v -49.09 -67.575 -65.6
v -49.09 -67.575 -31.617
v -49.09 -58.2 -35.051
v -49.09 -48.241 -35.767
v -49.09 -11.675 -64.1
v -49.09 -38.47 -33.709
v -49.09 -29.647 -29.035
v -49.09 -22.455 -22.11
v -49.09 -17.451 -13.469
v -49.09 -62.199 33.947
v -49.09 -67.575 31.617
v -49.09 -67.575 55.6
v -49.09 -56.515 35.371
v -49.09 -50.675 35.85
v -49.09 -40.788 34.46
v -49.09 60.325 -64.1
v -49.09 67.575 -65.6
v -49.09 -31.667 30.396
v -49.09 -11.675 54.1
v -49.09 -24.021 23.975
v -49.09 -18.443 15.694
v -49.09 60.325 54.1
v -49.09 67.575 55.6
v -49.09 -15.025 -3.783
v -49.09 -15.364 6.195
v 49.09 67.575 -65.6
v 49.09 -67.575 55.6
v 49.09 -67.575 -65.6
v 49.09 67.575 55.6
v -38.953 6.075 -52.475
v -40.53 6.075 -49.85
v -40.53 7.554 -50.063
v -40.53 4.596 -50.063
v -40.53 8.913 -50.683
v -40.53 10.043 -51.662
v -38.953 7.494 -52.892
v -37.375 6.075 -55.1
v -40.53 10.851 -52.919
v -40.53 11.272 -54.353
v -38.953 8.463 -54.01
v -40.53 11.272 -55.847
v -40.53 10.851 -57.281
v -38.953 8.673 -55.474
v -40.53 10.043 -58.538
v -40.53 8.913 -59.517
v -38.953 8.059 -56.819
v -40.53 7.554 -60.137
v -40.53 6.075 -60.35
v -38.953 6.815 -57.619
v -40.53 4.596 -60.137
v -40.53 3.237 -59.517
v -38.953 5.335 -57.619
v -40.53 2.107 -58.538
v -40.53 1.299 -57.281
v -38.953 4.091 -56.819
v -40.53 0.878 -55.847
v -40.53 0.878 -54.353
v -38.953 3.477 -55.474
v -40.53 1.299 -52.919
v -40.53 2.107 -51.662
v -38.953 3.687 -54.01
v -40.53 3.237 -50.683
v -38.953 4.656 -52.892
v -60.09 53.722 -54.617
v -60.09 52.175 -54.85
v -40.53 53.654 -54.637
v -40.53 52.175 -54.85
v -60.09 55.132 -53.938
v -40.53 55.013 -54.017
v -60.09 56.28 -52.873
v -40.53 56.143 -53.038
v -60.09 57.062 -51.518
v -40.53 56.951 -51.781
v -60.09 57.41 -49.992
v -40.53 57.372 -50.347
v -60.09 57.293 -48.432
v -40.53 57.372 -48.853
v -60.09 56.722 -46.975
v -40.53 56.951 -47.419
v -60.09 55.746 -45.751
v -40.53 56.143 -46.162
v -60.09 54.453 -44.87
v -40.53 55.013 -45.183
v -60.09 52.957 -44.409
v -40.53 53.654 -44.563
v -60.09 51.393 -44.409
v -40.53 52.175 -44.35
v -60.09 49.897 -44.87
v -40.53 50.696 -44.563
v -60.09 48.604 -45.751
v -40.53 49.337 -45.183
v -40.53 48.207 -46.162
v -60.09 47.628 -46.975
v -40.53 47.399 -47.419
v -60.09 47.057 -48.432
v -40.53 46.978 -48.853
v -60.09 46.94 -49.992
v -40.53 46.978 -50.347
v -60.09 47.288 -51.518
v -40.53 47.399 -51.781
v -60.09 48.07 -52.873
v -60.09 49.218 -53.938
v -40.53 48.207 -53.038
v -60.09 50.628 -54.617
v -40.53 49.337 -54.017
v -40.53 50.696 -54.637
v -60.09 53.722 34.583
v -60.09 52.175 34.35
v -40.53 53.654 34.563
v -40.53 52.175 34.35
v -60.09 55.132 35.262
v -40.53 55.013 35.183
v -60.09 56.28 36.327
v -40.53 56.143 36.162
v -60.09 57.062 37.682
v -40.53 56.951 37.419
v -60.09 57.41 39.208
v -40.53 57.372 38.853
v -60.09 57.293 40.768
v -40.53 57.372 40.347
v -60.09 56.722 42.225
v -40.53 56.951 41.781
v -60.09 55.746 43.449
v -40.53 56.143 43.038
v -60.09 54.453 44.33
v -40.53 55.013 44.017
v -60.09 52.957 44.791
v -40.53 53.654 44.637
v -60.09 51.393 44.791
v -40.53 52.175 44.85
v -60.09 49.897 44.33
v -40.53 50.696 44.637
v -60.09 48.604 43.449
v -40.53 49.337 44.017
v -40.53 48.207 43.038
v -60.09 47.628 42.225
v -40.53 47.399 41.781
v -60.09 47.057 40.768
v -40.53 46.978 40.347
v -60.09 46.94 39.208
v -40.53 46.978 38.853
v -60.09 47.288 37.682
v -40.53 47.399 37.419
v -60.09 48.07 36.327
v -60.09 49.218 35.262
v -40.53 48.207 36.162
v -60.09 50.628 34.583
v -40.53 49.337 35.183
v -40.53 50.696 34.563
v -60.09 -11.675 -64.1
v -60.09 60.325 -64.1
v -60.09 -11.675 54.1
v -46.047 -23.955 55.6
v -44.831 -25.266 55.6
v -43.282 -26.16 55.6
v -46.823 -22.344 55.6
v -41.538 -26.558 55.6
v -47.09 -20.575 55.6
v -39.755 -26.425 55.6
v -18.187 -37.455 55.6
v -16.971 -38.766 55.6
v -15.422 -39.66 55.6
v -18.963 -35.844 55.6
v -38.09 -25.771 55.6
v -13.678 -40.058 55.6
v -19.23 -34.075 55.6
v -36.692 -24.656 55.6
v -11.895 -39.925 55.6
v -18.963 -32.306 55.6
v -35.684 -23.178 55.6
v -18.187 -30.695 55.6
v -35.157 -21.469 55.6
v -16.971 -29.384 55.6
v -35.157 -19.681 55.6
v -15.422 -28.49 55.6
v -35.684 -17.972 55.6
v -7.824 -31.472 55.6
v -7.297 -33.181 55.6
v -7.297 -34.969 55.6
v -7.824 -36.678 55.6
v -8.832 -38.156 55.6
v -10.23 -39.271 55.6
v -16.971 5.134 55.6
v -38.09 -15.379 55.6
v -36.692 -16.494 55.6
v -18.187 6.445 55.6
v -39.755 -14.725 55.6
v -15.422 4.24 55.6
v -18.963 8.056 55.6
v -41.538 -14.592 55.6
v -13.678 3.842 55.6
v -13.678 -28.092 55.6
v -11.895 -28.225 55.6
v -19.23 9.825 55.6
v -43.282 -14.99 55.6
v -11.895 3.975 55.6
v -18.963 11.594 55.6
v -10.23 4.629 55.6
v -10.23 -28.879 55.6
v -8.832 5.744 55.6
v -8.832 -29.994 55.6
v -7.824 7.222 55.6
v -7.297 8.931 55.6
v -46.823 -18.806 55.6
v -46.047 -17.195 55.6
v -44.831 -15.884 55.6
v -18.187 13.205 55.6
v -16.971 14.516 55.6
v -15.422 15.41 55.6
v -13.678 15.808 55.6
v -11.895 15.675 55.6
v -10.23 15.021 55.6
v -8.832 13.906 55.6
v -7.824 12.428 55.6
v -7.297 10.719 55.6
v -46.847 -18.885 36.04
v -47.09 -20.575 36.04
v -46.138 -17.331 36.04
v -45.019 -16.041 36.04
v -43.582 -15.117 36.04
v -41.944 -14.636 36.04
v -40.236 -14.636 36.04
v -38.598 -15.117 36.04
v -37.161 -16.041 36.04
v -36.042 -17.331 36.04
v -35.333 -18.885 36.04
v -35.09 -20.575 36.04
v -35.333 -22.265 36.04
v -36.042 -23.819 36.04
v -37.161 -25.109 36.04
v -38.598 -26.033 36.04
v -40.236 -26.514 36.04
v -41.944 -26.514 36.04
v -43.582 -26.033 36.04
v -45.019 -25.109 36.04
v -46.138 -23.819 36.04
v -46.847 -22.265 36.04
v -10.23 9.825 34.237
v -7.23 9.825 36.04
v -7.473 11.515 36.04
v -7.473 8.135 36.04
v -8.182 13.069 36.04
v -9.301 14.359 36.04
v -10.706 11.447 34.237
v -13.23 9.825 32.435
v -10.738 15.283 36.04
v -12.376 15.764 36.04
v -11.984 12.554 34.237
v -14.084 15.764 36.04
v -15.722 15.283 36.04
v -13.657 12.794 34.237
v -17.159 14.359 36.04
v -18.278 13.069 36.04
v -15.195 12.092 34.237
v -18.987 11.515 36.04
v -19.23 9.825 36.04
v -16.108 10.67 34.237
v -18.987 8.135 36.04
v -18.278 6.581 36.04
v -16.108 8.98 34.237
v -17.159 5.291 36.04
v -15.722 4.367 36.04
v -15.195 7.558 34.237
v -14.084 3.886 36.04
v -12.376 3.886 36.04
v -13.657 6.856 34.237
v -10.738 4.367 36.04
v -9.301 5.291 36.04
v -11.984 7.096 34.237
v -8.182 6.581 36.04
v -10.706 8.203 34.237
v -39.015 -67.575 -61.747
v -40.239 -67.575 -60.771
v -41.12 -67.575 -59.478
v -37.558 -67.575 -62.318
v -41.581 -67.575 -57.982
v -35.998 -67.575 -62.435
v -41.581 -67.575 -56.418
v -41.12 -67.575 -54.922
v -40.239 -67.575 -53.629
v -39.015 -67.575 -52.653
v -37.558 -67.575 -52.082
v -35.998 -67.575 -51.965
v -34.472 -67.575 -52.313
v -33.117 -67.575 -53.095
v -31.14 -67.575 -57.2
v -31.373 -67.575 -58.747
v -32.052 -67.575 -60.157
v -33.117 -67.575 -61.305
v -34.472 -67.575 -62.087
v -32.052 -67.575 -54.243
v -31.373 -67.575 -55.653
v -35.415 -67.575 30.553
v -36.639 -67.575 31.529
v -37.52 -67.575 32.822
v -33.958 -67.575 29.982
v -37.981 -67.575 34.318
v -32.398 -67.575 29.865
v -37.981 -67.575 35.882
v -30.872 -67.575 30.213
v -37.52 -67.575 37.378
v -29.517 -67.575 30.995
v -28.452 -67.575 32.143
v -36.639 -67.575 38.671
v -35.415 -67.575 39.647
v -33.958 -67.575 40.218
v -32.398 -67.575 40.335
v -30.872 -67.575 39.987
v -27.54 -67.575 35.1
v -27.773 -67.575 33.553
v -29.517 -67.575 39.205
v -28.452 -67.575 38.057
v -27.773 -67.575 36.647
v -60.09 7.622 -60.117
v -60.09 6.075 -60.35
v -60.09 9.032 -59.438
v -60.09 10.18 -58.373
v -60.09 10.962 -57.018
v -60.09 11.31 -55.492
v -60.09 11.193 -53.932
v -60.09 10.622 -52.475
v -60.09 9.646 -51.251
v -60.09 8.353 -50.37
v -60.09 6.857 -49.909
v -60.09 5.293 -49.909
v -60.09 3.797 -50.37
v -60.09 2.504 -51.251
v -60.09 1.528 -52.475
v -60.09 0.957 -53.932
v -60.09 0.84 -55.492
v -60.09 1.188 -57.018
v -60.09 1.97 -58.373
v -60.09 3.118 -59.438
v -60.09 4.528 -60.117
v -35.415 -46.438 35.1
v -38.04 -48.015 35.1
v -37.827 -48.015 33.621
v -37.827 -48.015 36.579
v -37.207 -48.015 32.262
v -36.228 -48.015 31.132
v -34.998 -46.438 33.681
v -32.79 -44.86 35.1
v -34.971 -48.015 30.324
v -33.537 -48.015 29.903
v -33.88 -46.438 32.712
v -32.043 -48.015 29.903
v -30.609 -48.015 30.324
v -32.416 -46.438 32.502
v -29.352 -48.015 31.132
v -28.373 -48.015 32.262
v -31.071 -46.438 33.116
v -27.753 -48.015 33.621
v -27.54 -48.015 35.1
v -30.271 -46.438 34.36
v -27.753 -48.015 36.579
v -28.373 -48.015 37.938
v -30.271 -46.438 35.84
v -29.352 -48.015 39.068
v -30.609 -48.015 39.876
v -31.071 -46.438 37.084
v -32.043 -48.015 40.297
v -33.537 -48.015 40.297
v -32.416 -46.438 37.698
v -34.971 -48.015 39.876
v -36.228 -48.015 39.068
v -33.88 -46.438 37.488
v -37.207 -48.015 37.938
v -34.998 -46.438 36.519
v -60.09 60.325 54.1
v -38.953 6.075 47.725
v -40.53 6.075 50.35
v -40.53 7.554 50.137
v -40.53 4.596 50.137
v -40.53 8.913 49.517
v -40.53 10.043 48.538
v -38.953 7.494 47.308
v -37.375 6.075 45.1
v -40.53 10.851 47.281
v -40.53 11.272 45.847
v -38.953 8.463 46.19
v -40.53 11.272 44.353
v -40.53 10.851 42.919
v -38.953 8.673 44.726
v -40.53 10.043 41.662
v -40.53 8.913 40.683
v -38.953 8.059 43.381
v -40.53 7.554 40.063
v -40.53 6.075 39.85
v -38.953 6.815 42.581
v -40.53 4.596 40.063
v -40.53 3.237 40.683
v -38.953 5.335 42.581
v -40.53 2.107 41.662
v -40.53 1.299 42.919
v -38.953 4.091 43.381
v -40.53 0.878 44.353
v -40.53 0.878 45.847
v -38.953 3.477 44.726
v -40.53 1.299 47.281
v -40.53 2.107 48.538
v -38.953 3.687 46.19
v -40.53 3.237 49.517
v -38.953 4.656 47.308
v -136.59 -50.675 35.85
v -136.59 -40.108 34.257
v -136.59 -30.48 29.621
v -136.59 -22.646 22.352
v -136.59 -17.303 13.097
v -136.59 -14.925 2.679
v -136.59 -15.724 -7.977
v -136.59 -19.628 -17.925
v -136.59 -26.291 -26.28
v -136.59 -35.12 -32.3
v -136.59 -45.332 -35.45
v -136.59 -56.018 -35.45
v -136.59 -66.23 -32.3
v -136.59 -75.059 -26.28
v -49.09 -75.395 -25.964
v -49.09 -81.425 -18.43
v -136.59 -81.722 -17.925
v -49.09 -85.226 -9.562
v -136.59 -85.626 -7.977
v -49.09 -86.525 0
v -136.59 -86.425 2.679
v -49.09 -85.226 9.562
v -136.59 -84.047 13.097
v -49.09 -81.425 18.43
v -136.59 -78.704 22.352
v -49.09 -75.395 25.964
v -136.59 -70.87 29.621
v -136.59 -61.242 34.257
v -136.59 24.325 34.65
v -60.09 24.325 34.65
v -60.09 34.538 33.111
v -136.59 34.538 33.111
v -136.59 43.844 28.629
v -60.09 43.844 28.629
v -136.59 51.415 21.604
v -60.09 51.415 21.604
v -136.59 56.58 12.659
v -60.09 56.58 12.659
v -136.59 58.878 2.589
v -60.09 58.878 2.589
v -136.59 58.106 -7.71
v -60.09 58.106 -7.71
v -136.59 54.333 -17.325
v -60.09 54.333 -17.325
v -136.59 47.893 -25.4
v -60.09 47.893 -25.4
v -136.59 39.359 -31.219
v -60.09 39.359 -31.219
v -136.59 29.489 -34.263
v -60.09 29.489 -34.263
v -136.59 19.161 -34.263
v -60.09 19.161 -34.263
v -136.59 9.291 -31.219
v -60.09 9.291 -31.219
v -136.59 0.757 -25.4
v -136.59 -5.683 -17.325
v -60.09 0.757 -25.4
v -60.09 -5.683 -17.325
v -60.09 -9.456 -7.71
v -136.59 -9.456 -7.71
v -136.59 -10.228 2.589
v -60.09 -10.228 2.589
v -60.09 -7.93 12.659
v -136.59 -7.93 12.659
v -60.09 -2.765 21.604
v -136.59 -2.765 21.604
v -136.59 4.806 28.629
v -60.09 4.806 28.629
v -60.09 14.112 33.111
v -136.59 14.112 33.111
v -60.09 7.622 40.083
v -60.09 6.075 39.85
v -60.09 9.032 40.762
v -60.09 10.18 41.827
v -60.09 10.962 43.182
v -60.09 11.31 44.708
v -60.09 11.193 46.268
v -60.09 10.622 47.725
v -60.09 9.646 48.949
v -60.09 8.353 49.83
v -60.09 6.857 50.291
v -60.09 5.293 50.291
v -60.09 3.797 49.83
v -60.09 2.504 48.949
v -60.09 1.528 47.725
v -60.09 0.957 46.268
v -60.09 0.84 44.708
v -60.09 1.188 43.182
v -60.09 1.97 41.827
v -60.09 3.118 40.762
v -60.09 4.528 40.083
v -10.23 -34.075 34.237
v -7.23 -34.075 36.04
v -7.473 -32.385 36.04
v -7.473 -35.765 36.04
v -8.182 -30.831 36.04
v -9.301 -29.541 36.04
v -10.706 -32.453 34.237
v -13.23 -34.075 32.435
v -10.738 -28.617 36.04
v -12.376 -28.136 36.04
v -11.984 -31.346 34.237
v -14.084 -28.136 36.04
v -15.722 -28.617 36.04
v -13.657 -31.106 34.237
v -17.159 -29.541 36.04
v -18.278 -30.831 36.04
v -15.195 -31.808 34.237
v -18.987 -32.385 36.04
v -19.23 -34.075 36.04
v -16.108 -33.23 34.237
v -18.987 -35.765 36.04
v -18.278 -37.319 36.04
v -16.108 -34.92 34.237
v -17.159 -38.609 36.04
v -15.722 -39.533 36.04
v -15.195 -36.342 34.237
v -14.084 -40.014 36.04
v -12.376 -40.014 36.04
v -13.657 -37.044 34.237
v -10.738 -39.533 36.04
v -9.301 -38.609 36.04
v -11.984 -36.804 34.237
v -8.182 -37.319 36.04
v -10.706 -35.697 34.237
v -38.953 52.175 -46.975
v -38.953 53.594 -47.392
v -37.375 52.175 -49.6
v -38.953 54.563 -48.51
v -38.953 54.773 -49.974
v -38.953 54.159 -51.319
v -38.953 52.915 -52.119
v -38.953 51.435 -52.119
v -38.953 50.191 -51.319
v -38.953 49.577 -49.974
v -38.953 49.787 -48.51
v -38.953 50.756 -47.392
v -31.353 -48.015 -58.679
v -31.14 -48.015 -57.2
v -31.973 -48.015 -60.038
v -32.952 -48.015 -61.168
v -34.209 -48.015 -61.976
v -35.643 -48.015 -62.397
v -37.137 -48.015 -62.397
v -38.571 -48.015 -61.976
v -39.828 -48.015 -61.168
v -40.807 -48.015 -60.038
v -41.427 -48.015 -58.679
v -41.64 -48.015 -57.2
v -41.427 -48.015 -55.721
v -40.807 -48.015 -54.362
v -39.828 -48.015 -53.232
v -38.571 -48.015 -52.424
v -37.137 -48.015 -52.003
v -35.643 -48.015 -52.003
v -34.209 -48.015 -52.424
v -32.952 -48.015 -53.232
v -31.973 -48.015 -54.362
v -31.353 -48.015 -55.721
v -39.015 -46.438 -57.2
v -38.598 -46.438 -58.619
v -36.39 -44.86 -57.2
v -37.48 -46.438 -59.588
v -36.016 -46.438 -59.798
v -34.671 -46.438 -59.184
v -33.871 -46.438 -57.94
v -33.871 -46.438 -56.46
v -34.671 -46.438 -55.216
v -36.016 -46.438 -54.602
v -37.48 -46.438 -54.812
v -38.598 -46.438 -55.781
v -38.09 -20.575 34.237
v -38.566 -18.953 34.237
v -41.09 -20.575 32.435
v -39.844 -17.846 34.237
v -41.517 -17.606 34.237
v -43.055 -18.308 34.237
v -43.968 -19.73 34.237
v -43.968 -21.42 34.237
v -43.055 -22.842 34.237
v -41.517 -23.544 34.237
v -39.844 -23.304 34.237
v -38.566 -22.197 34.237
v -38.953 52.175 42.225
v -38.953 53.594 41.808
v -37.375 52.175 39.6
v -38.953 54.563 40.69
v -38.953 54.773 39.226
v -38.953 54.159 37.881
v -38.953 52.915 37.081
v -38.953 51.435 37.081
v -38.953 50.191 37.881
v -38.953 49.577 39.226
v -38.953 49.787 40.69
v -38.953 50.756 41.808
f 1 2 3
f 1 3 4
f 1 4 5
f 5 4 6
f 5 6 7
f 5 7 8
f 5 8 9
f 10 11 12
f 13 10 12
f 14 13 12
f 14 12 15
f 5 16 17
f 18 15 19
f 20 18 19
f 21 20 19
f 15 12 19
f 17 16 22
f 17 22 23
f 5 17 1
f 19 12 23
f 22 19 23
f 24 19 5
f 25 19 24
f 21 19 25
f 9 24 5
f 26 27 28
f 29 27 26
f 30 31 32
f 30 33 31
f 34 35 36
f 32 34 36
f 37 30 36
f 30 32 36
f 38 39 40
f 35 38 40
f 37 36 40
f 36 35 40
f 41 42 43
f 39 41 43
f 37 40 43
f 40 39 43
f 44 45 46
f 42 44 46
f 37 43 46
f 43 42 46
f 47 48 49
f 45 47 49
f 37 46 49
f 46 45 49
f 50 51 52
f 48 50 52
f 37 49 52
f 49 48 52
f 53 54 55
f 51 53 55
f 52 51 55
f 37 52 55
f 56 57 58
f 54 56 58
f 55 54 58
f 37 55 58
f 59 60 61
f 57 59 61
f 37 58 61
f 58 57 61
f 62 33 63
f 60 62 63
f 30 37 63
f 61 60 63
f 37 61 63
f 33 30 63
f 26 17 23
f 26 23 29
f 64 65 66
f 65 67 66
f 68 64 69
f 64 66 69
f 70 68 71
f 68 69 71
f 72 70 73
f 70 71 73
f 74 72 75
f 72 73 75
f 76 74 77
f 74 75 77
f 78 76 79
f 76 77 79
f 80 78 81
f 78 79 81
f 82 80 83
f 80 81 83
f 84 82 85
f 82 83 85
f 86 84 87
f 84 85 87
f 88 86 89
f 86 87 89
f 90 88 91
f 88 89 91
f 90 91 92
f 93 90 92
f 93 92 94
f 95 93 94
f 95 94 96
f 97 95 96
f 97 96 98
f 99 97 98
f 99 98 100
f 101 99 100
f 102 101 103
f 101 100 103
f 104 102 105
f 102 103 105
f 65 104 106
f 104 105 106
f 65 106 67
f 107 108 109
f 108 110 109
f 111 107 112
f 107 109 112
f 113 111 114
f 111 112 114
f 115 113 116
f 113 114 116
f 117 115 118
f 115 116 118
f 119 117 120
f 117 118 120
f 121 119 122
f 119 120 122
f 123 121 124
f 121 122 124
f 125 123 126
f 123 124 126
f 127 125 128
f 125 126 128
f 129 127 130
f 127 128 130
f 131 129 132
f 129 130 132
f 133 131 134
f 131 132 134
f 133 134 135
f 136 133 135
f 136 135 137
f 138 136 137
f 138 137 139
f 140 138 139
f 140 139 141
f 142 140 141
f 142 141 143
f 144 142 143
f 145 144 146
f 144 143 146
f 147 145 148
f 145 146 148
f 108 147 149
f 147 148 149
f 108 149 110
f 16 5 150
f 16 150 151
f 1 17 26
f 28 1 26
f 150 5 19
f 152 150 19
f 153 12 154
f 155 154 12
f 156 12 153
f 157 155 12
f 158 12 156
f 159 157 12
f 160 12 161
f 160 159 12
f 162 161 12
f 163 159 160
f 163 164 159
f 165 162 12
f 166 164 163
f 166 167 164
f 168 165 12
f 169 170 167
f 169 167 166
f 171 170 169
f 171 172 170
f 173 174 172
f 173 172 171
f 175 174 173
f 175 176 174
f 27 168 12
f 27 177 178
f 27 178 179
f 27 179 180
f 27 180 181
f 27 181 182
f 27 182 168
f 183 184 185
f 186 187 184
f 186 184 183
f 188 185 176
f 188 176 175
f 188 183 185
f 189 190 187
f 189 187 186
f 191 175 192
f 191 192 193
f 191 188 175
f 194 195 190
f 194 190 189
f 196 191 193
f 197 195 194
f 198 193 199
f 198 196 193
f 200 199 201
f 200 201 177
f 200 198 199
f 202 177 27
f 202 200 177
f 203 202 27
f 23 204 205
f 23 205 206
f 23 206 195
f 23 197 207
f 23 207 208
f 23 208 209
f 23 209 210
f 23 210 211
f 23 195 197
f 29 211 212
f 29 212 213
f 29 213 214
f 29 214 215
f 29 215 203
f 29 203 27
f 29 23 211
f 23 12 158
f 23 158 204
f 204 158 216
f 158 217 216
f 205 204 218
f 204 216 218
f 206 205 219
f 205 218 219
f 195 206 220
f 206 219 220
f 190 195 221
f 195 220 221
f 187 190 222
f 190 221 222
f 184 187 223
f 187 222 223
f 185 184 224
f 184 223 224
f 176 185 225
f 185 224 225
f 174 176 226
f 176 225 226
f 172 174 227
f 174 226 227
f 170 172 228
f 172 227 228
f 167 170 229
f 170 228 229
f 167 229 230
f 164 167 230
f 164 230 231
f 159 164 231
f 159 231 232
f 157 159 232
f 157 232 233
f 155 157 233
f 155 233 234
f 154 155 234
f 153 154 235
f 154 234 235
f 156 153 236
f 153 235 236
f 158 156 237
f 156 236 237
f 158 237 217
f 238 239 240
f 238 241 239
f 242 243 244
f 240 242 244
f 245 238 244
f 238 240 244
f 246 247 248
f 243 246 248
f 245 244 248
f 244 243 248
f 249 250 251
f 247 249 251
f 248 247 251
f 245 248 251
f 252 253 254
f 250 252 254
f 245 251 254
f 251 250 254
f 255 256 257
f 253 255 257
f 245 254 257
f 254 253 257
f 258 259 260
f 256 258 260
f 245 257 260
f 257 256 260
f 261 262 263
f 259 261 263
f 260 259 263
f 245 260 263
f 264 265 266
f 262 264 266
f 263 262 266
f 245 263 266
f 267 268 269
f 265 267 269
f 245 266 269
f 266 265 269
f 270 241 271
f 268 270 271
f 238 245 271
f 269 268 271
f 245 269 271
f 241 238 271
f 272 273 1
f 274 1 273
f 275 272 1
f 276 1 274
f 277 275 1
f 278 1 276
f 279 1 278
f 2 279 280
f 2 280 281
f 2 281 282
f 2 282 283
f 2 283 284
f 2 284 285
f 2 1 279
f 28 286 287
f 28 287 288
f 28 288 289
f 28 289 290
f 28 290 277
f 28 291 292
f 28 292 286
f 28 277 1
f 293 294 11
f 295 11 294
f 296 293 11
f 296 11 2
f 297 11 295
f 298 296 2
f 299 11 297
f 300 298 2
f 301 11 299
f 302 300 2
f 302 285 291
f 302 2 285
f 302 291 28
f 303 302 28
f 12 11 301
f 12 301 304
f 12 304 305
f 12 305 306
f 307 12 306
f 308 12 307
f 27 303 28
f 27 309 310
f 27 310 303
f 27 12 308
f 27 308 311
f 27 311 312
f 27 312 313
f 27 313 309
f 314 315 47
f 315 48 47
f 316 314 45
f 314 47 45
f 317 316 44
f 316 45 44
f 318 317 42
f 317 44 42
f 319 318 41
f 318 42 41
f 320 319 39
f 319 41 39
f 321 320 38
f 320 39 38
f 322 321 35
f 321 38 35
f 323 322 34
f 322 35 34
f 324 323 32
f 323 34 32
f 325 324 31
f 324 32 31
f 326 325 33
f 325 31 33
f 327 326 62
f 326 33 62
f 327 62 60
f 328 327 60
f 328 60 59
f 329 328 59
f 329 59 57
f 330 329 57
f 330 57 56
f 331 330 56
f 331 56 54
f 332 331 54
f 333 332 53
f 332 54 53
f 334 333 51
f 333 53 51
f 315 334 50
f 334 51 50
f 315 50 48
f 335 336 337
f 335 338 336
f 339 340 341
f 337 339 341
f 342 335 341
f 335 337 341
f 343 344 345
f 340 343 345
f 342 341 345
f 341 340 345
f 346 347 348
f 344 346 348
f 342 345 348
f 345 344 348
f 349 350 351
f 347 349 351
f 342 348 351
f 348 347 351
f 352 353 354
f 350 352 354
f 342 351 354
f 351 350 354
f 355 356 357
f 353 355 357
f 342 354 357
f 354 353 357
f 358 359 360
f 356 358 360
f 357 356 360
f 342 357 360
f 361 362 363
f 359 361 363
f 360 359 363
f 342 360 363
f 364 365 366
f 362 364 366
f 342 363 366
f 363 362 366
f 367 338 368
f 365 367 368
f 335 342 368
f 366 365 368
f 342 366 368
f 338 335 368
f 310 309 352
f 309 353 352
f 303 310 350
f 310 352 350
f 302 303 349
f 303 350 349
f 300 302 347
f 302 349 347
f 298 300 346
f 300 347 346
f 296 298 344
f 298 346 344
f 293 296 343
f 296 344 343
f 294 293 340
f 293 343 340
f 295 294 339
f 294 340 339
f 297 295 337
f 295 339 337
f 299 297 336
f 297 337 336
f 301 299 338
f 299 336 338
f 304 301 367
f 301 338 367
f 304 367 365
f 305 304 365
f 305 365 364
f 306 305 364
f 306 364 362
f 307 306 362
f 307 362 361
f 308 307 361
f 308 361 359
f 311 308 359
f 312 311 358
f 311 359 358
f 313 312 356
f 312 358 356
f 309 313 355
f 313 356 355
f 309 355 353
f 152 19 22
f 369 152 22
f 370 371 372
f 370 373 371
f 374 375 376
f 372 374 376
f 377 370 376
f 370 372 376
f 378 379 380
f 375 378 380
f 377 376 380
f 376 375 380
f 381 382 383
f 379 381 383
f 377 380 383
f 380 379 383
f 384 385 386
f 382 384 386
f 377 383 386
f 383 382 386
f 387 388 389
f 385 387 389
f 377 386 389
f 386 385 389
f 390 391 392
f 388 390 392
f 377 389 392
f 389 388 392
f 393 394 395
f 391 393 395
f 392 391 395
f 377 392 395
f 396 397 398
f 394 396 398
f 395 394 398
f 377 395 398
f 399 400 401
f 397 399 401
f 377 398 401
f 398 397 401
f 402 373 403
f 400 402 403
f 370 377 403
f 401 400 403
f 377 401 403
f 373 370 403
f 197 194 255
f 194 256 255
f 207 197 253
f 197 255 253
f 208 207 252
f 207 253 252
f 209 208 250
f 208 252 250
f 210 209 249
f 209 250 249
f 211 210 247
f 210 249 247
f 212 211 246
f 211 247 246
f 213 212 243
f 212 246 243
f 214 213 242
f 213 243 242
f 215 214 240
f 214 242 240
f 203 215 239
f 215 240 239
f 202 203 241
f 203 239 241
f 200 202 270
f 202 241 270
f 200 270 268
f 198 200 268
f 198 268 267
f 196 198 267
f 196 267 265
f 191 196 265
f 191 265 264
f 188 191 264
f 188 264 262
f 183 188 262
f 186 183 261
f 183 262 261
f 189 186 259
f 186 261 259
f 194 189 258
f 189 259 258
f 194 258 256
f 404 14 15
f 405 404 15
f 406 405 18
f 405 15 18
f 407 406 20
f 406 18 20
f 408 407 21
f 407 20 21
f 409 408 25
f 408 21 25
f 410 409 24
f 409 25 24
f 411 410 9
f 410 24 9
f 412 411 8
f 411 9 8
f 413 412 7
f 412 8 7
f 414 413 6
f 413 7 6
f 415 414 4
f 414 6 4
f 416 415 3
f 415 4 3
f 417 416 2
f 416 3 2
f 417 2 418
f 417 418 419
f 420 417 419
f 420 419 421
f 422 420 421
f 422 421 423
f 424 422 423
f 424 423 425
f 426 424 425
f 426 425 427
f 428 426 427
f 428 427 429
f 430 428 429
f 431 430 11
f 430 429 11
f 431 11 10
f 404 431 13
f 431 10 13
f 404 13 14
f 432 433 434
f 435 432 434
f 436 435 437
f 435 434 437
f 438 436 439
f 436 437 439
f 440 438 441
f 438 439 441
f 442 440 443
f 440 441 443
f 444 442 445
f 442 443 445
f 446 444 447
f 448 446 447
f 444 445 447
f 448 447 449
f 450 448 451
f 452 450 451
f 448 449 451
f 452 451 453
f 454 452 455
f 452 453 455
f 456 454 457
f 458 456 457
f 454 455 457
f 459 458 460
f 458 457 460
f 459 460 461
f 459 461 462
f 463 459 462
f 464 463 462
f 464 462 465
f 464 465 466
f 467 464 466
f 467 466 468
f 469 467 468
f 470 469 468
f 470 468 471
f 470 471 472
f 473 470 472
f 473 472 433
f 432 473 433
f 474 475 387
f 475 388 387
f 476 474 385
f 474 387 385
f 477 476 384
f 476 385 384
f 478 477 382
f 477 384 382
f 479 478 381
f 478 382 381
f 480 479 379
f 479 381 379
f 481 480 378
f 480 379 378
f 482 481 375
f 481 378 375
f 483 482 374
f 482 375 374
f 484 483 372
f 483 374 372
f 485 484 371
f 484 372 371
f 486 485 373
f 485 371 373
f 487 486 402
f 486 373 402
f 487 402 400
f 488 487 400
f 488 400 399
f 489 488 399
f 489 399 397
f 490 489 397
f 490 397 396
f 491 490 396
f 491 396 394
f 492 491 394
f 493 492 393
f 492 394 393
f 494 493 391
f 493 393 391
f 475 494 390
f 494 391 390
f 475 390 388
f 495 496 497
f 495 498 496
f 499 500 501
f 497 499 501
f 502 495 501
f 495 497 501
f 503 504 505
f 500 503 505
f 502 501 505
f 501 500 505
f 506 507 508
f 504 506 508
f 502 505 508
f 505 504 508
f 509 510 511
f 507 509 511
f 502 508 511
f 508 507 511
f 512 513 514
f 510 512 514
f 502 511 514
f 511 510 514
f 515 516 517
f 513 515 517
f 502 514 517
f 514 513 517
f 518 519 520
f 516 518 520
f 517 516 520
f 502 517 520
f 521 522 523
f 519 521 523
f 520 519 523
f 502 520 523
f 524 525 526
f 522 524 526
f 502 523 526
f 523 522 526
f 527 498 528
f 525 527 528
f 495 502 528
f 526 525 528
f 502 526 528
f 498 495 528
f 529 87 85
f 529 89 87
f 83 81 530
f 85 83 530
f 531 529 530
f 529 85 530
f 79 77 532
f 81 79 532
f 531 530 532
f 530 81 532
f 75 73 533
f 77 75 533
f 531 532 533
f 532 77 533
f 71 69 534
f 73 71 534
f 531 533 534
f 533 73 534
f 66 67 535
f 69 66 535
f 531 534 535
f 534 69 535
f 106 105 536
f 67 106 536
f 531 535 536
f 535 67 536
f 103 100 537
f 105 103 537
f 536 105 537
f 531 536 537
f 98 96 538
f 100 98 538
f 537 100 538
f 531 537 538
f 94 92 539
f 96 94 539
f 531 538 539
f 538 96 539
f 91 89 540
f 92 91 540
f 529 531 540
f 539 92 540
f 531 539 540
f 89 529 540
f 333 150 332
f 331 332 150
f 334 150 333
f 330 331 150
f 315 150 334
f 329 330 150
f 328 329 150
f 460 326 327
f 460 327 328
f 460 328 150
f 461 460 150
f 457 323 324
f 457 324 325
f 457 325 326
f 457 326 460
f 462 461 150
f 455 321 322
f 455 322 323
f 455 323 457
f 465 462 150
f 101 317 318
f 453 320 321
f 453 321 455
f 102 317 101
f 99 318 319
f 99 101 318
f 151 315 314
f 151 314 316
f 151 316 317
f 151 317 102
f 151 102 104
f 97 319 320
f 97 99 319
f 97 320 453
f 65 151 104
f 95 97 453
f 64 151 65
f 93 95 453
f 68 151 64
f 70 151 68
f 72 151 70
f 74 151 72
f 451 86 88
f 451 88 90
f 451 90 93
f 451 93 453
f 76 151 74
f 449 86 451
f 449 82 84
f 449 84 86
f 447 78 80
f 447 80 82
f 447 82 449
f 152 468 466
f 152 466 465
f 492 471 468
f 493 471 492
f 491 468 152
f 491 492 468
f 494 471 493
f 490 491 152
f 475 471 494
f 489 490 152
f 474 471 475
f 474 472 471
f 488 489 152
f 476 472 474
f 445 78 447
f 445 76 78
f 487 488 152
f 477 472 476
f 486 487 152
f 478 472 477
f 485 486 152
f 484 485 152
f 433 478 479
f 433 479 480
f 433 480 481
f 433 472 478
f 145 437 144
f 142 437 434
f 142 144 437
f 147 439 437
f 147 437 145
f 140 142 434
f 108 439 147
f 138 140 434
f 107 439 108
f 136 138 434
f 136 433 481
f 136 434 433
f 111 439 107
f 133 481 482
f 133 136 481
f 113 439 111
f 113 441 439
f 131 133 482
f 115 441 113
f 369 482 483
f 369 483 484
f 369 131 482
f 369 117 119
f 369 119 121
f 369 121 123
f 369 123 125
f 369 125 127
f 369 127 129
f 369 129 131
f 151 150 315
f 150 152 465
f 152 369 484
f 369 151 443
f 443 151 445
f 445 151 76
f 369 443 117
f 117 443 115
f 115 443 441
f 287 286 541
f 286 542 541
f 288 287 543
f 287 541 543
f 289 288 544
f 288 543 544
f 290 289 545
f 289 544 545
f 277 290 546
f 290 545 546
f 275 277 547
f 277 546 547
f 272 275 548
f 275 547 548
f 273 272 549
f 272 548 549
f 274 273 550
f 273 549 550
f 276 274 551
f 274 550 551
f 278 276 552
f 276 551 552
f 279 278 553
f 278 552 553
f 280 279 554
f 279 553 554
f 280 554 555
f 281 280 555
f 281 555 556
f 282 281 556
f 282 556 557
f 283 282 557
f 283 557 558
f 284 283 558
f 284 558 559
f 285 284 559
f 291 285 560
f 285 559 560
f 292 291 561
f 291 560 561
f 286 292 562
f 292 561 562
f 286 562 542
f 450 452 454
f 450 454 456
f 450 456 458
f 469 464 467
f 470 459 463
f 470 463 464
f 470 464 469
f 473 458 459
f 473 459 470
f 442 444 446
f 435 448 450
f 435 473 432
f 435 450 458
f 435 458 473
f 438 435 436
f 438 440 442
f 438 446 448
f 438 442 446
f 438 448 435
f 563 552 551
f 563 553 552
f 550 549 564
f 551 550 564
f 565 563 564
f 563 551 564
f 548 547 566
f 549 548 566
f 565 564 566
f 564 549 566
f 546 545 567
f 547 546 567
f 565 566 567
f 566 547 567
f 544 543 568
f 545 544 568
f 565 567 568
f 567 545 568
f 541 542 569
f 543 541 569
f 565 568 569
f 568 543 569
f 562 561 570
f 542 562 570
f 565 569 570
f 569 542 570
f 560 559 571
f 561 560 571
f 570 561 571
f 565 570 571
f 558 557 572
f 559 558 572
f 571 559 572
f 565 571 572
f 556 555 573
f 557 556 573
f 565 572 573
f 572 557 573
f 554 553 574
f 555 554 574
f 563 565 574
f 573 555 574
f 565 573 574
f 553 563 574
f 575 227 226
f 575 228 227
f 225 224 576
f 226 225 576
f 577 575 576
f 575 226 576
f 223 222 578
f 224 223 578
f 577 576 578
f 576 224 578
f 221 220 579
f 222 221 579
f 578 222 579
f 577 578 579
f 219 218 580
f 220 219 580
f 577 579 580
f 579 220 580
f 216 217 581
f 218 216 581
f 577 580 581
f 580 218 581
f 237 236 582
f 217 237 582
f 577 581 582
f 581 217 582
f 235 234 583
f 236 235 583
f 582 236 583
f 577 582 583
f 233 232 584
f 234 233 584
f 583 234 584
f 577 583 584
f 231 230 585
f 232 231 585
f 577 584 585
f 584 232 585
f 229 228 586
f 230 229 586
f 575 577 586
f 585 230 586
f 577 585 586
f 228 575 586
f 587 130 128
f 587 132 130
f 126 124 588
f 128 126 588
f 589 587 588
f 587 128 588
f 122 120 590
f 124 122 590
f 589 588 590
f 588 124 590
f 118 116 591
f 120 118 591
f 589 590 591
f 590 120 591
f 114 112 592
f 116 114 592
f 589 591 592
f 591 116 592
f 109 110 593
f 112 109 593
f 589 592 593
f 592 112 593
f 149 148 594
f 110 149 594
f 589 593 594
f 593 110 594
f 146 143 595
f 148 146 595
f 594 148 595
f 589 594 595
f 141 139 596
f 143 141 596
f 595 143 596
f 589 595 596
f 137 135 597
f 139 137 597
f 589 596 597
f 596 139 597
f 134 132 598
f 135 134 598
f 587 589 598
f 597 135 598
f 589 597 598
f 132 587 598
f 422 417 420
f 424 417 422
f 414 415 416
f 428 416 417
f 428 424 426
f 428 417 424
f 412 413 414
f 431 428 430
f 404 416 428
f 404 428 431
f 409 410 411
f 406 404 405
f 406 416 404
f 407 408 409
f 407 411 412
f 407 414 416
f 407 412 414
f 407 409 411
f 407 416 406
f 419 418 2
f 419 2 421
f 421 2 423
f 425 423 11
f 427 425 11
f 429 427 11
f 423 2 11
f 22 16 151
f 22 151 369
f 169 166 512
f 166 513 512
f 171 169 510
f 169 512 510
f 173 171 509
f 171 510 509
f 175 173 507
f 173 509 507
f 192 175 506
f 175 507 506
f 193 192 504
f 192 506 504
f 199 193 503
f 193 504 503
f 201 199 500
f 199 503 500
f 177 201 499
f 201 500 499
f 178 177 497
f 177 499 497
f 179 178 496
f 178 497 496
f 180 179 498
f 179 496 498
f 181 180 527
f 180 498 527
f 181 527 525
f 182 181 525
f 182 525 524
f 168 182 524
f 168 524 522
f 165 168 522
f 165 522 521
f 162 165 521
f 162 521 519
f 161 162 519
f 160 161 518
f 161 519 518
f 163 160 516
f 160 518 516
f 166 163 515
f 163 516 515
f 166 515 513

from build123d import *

# Parameters (mm, degrees)
SKETCH2_W                        = 98.18
SKETCH2_H                        = 135.15
BOSS_EXTRUDE1_DEPTH              = 55.6
BOSS_EXTRUDE1_DEPTH_BACK         = 65.6
SKETCH3_R                        = 34.65
SKETCH3_R_2                      = 35.85
BOSS_EXTRUDE2_DEPTH              = 87.5
TAP_DRILL_FOR_M14X2_0_TAP1_D     = 12
TAP_DRILL_FOR_M14X2_0_TAP1_DEPTH = 19.56
TAP_DRILL_FOR_M14X2_0_TAP1_TIP   = 3.605163714
TAP_DRILL_FOR_M12X1_5_TAP2_D     = 10.5
TAP_DRILL_FOR_M12X1_5_TAP2_DEPTH = 19.56
TAP_DRILL_FOR_M12X1_5_TAP2_TIP   = 3.15451825
SKETCH8_W                        = 118.2
SKETCH8_H                        = 72
BOSS_EXTRUDE3_DEPTH              = 11
TAP_DRILL_FOR_M12X1_5_TAP3_D     = 10.5
TAP_DRILL_FOR_M12X1_5_TAP3_DEPTH = 19.56
TAP_DRILL_FOR_M12X1_5_TAP3_TIP   = 3.15451825


with BuildPart() as part:
    # Sketch2 → Boss-Extrude1 (new body, two sides)
    with BuildSketch(Plane.XY) as boss_extrude1_sk:
        Rectangle(SKETCH2_W, SKETCH2_H)
    extrude(amount=BOSS_EXTRUDE1_DEPTH)
    extrude(boss_extrude1_sk.sketch, amount=-BOSS_EXTRUDE1_DEPTH_BACK)

    # Sketch3 → Boss-Extrude2 (add)
    with BuildSketch(Plane.ZY.offset(49.09)):
        with Locations((0, 24.325)):
            Circle(SKETCH3_R)
        with Locations((0, -50.675)):
            Circle(SKETCH3_R_2)
    extrude(amount=BOSS_EXTRUDE2_DEPTH)

    # Tap Drill for M14x2.0 Tap1
    with Locations(Plane.XY.offset(55.6)):
        with Locations((-13.23, 9.825), (-13.23, -34.075), (-41.09, -20.575)):
            Hole(TAP_DRILL_FOR_M14X2_0_TAP1_D / 2, depth=TAP_DRILL_FOR_M14X2_0_TAP1_DEPTH)
            with Locations((0, 0, -(TAP_DRILL_FOR_M14X2_0_TAP1_DEPTH + TAP_DRILL_FOR_M14X2_0_TAP1_TIP / 2))):  # 118° drill point
                Cone(0, TAP_DRILL_FOR_M14X2_0_TAP1_D / 2, TAP_DRILL_FOR_M14X2_0_TAP1_TIP, mode=Mode.SUBTRACT)

    # Tap Drill for M12x1.5 Tap2
    with Locations(Plane(origin=(0, -67.575, 0), x_dir=(-1, 0, 0), z_dir=(0, -1, 0))):
        with Locations((32.79, -35.1), (36.39, 57.2)):
            Hole(TAP_DRILL_FOR_M12X1_5_TAP2_D / 2, depth=TAP_DRILL_FOR_M12X1_5_TAP2_DEPTH)
            with Locations((0, 0, -(TAP_DRILL_FOR_M12X1_5_TAP2_DEPTH + TAP_DRILL_FOR_M12X1_5_TAP2_TIP / 2))):  # 118° drill point
                Cone(0, TAP_DRILL_FOR_M12X1_5_TAP2_D / 2, TAP_DRILL_FOR_M12X1_5_TAP2_TIP, mode=Mode.SUBTRACT)

    # Sketch8 → Boss-Extrude3 (add)
    with BuildSketch(Plane.ZY.offset(49.09)):
        with Locations((-5, 24.325)):
            Rectangle(SKETCH8_W, SKETCH8_H)
    extrude(amount=BOSS_EXTRUDE3_DEPTH)

    # Tap Drill for M12x1.5 Tap3
    with Locations(Plane.ZY.offset(60.09)):
        with Locations((-49.6, 52.175), (-55.1, 6.075), (45.1, 6.075), (39.6, 52.175)):
            Hole(TAP_DRILL_FOR_M12X1_5_TAP3_D / 2, depth=TAP_DRILL_FOR_M12X1_5_TAP3_DEPTH)
            with Locations((0, 0, -(TAP_DRILL_FOR_M12X1_5_TAP3_DEPTH + TAP_DRILL_FOR_M12X1_5_TAP3_TIP / 2))):  # 118° drill point
                Cone(0, TAP_DRILL_FOR_M12X1_5_TAP3_D / 2, TAP_DRILL_FOR_M12X1_5_TAP3_TIP, mode=Mode.SUBTRACT)


solid = part.part
